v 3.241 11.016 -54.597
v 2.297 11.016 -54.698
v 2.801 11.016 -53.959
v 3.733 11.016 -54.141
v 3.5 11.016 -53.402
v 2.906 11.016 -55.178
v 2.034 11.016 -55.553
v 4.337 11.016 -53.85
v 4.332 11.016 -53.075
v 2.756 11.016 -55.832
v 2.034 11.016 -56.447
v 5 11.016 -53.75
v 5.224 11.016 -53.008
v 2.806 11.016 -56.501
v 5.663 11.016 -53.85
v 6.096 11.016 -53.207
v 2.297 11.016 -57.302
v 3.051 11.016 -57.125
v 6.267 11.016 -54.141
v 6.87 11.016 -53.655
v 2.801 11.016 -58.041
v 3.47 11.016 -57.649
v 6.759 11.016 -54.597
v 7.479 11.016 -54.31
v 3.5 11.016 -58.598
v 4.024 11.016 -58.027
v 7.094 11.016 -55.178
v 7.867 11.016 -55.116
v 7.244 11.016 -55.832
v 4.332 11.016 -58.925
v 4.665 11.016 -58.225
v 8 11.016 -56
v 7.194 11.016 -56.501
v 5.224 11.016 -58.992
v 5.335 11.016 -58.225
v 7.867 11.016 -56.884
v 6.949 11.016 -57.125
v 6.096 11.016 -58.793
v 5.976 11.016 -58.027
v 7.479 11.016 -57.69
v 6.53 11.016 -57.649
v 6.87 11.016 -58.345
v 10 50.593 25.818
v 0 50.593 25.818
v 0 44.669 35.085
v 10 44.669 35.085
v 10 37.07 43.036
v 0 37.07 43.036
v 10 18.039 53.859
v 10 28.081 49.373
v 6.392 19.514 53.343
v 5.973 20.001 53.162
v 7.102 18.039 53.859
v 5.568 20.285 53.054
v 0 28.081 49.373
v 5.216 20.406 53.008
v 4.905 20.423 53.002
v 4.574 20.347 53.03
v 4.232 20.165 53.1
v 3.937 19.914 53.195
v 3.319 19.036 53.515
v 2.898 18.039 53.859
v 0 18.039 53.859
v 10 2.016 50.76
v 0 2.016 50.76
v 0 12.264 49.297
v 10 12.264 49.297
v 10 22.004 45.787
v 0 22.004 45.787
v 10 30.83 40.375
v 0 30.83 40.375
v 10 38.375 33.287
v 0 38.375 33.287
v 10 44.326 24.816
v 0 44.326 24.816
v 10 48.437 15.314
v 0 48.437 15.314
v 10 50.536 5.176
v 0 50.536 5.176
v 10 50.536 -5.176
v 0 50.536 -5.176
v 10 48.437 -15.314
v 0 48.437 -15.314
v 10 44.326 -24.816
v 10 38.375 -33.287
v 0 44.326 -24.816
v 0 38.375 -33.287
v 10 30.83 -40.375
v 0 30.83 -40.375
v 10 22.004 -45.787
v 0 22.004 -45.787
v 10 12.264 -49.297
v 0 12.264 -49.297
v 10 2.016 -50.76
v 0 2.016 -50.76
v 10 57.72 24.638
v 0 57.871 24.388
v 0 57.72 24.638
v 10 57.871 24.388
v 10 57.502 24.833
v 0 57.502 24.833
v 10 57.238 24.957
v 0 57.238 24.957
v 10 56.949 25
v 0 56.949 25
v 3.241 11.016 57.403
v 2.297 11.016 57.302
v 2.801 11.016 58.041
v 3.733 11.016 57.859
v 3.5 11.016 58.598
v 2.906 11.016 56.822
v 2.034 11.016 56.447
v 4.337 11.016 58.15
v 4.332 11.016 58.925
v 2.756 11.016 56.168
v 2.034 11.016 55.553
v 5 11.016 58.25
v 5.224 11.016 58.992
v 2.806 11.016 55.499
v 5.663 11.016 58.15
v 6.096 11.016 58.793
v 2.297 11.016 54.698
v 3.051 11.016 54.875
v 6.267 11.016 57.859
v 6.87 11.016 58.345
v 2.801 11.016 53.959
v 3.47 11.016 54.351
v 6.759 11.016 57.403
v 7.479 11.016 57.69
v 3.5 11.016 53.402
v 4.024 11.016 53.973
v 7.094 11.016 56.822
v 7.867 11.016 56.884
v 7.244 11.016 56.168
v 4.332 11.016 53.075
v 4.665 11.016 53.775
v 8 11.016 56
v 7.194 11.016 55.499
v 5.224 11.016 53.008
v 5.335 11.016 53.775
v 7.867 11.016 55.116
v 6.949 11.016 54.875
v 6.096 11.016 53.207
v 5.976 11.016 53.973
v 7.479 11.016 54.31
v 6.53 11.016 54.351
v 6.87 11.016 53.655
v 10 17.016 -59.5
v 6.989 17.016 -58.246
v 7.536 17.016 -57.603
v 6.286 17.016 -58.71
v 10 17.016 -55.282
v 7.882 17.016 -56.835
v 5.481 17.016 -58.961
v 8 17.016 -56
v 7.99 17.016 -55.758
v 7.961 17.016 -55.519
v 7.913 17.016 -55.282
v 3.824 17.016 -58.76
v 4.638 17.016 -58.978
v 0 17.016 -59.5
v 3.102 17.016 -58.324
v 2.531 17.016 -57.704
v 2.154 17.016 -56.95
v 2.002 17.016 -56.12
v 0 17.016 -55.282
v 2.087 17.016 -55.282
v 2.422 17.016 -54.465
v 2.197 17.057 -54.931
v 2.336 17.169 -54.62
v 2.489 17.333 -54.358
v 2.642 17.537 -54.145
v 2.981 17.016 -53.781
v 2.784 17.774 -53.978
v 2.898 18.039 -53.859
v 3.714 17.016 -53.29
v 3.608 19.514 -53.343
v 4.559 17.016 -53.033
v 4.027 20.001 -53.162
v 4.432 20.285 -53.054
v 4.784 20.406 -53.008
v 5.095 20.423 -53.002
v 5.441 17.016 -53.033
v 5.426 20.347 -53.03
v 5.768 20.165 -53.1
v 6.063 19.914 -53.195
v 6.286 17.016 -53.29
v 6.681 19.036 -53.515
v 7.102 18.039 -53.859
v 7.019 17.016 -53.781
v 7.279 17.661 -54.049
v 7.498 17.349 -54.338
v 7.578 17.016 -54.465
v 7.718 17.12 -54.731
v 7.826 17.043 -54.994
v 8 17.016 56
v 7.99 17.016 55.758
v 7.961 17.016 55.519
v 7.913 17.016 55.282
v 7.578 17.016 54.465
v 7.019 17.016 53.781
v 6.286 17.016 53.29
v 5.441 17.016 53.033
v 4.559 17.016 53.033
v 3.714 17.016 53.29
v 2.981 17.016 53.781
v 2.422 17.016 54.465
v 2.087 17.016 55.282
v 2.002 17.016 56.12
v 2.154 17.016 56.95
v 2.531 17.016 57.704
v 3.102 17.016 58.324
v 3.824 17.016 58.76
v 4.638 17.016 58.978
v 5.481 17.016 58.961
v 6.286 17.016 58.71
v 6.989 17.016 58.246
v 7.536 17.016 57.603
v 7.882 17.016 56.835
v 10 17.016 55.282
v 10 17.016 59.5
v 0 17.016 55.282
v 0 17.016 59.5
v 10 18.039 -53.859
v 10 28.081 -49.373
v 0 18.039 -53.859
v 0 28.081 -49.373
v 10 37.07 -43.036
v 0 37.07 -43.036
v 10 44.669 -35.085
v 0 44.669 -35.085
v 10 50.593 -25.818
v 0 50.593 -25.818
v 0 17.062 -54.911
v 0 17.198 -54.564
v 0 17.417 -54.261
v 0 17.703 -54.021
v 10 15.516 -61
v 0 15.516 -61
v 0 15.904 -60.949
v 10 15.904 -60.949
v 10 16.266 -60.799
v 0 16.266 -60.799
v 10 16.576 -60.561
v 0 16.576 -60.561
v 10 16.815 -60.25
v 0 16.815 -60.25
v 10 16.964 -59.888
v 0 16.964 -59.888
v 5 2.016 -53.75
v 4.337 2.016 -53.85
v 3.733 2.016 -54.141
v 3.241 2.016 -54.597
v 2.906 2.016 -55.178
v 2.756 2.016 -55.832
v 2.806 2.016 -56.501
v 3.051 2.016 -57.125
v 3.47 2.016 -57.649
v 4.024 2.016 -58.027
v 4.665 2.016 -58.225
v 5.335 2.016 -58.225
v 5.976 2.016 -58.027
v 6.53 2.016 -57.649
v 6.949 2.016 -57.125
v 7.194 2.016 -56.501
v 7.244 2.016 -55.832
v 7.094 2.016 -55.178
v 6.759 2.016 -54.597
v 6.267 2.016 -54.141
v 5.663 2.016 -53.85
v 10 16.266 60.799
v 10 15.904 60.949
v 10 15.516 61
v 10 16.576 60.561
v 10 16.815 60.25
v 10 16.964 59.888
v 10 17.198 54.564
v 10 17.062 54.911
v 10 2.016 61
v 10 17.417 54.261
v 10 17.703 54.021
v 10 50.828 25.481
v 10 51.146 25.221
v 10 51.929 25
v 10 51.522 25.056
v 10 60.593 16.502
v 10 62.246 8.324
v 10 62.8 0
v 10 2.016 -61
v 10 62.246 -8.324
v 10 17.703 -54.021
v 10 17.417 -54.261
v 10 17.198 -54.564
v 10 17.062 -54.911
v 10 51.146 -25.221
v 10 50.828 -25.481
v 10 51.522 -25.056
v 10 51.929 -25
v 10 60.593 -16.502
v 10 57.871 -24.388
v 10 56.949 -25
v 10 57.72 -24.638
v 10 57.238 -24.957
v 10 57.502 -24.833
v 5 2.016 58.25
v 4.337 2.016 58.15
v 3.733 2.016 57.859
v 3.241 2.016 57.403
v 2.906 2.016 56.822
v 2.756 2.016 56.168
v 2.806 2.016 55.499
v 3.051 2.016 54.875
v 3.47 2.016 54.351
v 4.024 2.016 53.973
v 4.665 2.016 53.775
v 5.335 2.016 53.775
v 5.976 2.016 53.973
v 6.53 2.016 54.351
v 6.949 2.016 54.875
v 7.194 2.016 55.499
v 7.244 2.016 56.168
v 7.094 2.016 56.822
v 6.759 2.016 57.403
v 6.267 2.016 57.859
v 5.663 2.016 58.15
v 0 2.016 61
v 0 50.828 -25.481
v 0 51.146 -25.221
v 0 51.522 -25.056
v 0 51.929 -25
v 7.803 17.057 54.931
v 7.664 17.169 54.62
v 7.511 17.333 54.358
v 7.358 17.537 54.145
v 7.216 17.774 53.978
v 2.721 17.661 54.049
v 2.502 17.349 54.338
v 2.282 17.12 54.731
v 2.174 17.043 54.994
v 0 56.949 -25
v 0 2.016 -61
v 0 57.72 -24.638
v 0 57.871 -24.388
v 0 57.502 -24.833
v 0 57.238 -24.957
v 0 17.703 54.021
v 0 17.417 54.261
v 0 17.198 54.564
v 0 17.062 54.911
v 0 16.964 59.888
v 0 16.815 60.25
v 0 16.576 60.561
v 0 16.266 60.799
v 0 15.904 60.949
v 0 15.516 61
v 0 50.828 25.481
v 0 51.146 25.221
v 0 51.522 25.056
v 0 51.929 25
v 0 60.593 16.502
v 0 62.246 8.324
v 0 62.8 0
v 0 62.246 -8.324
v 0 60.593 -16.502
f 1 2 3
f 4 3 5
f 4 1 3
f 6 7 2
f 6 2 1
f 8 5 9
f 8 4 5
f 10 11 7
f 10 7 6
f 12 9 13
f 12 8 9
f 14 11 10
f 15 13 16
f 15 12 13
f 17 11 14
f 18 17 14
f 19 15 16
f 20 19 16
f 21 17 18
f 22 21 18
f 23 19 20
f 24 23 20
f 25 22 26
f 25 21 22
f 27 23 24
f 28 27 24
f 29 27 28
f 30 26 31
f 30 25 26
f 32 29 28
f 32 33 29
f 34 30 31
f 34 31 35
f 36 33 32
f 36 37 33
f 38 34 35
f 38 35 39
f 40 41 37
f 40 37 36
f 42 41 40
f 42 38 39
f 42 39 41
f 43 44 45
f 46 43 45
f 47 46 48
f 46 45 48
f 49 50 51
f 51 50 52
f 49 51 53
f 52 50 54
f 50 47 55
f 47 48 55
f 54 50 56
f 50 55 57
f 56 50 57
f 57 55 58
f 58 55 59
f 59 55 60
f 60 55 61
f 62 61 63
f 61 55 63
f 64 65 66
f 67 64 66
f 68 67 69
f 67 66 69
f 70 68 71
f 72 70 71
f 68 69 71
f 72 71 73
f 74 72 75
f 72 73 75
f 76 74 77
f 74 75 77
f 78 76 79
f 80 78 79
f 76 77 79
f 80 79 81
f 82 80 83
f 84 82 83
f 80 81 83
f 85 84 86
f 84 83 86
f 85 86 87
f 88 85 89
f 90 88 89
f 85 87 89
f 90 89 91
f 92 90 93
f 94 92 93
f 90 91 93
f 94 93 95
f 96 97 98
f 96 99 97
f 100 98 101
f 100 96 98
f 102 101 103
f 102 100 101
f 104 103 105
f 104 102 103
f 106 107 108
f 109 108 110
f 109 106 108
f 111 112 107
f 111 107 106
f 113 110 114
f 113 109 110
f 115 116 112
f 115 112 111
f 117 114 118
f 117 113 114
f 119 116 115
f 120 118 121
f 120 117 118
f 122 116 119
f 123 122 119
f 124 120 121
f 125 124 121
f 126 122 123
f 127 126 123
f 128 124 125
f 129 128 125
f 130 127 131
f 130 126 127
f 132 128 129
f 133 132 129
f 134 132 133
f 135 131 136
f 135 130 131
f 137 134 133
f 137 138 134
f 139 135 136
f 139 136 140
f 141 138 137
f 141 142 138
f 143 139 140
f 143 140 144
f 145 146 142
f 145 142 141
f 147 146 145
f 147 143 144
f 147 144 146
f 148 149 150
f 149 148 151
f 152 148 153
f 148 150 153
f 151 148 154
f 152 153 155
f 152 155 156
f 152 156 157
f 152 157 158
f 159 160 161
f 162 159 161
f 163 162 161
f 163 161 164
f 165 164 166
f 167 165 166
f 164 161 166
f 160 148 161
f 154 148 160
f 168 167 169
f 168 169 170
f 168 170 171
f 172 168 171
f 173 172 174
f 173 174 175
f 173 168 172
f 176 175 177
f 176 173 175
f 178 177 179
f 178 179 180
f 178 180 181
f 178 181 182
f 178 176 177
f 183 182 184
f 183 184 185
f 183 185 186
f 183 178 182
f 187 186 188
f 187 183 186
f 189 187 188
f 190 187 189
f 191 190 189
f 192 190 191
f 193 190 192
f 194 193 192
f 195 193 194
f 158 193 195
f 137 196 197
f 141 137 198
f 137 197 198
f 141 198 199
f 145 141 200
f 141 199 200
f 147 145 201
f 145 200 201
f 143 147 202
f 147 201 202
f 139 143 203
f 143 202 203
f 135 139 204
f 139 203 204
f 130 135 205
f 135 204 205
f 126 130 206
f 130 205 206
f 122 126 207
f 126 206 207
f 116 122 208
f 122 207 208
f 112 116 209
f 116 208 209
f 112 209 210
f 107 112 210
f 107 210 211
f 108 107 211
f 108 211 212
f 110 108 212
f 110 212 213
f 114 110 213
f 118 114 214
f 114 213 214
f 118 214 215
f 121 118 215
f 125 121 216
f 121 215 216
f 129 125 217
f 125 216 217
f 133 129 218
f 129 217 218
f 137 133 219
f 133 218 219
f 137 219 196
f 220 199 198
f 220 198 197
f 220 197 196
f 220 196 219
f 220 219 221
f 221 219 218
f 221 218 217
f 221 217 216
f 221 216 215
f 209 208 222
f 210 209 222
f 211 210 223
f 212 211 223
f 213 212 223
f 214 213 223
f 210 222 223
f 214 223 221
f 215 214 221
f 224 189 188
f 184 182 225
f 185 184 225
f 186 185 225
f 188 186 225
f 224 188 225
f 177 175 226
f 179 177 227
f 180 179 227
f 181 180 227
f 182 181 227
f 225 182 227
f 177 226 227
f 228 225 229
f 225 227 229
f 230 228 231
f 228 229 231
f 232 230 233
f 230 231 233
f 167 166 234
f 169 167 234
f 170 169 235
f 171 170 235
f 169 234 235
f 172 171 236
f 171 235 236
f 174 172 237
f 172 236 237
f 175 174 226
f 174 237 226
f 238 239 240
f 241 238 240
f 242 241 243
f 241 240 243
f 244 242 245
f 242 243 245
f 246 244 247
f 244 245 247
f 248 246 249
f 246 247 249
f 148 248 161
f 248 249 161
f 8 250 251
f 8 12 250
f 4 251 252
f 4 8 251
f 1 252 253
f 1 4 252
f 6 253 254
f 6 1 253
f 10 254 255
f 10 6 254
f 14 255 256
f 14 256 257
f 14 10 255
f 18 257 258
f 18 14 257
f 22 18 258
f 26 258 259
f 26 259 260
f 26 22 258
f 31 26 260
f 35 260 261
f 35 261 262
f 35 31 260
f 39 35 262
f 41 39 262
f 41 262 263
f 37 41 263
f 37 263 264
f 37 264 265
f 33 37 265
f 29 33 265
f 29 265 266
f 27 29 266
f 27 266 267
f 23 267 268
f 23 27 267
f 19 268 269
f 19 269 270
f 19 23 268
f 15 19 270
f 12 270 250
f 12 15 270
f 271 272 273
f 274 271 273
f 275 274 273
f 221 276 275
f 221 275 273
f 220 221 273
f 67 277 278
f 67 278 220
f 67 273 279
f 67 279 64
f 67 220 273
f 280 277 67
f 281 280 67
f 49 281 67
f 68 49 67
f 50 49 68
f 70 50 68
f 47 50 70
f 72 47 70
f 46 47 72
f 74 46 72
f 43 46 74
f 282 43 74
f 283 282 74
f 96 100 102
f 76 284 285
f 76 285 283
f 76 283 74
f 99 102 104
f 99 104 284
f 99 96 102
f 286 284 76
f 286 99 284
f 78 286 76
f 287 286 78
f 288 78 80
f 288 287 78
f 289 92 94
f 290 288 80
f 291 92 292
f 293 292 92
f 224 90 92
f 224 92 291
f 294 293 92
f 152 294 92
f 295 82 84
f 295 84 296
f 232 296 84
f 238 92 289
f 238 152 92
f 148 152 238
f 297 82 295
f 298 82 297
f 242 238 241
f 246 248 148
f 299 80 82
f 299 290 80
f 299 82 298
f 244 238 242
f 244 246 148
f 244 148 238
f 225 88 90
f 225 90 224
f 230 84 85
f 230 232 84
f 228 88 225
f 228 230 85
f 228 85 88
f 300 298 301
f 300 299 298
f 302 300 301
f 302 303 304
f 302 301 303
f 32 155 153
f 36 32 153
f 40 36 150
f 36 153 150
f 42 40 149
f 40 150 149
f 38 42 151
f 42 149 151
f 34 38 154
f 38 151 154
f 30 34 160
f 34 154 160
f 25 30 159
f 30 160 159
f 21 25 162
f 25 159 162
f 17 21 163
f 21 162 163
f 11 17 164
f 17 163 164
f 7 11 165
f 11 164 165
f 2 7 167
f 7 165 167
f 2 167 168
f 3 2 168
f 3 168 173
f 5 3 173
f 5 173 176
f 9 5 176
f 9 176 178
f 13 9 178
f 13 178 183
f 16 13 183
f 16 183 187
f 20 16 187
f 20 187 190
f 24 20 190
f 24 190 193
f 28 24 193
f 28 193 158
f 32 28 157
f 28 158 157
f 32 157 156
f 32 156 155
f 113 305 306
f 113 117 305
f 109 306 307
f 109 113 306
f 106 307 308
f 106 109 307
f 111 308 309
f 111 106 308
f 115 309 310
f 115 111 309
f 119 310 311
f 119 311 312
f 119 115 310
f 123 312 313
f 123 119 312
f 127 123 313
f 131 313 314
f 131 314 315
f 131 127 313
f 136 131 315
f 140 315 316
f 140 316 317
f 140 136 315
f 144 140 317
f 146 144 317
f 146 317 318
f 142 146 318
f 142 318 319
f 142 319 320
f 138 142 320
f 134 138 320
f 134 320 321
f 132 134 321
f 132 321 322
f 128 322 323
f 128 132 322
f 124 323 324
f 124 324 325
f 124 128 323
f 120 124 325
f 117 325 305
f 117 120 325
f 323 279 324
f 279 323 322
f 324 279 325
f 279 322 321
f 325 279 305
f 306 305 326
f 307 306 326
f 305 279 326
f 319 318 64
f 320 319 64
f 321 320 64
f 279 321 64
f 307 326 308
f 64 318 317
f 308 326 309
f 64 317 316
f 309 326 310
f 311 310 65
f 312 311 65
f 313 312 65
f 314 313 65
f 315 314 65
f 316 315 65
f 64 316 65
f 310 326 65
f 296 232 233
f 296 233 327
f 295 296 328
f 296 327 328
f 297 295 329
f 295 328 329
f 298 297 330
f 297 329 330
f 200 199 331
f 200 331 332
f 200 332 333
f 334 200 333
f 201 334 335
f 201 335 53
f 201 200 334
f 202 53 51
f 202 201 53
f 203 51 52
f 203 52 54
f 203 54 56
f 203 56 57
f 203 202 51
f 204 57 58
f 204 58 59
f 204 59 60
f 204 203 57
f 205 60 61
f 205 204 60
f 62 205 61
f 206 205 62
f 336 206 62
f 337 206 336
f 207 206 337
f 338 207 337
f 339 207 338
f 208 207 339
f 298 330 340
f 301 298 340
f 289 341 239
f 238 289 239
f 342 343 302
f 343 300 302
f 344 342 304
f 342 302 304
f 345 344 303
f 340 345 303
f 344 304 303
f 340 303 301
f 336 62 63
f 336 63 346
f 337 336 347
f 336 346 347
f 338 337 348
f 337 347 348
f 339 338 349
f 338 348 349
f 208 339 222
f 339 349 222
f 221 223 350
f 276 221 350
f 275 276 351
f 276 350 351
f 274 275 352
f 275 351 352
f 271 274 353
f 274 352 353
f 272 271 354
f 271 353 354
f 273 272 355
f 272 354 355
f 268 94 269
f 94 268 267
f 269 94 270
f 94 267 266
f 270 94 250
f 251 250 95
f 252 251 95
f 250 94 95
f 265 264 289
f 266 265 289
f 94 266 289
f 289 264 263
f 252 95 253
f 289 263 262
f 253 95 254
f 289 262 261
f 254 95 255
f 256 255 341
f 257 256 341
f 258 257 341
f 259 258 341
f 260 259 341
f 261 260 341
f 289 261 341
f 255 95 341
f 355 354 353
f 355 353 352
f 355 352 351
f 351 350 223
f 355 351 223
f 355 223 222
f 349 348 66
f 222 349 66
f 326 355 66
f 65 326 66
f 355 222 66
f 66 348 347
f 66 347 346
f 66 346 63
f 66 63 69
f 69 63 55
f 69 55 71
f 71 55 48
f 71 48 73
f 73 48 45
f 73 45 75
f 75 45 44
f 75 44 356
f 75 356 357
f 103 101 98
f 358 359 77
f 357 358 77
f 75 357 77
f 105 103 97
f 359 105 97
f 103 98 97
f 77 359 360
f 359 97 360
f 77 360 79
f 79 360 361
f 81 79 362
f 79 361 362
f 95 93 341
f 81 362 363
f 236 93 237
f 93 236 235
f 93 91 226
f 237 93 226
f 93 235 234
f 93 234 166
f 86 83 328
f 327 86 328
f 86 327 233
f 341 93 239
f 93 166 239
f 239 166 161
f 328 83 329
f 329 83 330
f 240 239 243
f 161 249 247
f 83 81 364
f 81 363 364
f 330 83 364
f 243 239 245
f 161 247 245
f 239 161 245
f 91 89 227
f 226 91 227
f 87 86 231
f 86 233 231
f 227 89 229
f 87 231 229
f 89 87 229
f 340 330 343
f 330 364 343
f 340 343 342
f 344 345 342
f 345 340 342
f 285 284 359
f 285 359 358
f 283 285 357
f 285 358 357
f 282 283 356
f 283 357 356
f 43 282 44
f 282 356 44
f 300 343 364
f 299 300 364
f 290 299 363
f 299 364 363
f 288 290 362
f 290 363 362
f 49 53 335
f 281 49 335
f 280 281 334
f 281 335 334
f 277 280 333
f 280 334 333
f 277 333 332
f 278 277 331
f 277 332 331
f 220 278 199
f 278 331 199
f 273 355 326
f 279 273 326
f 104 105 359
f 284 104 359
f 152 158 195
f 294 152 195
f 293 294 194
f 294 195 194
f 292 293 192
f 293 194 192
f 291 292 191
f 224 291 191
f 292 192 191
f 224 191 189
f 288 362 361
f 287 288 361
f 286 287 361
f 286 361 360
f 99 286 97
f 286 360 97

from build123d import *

# Parameters (mm, degrees)
BOSS_EXTRUDE1_DEPTH           = 10
M4_CLEARANCE_HOLE1_AT_2_COUNT = 2
M4_CLEARANCE_HOLE1_AT_2_PITCH = 112
SKETCH6_R                     = 3
CUT_EXTRUDE1_DEPTH            = 8
CUT_EXTRUDE1_DEPTH_BACK       = 6
FILLET1_R                     = 1


with BuildPart() as part:
    # Sketch1 → Boss-Extrude1 (new body)
    with BuildSketch(Plane(origin=(0, 0, 0), x_dir=(0, 0, -1), z_dir=(1, 0, 0))):
        with BuildLine():
            ThreePointArc((25, 57.609374237), (12.766583292, 61.488652214), (0, 62.8))
            ThreePointArc((0, 62.8), (-12.766583292, 61.488652214), (-25, 57.609374237))
            Line((-25, 57.609374237), (-25, 51.929182547))
            ThreePointArc((-25, 51.929182547), (-25.220795702, 51.145833095), (-25.818181818, 50.593097233))
            ThreePointArc((-25.818181818, 50.593097233), (-43.035646203, 37.069841595), (-53.859344034, 18.039153533))
            ThreePointArc((-53.859344034, 18.039153533), (-54.405495004, 17.298046479), (-55.281685866, 17.01553963))
            Line((-55.281685866, 17.01553963), (-59.5, 17.01553963))
            ThreePointArc((-59.5, 17.01553963), (-60.560660172, 16.576199802), (-61, 15.51553963))
            Line((-61, 15.51553963), (-61, 2.01553963))
            Line((-61, 2.01553963), (-50.76, 2.01553963))
            ThreePointArc((-50.76, 2.01553963), (0, 50.8), (50.76, 2.01553963))
            Line((50.76, 2.01553963), (61, 2.01553963))
            Line((61, 2.01553963), (61, 15.51553963))
            ThreePointArc((61, 15.51553963), (60.560660172, 16.576199802), (59.5, 17.01553963))
            Line((59.5, 17.01553963), (55.281685866, 17.01553963))
            ThreePointArc((55.281685866, 17.01553963), (54.405495004, 17.298046479), (53.859344034, 18.039153533))
            ThreePointArc((53.859344034, 18.039153533), (43.035646203, 37.069841595), (25.818181818, 50.593097233))
            ThreePointArc((25.818181818, 50.593097233), (25.220795702, 51.145833095), (25, 51.929182547))
            Line((25, 51.929182547), (25, 57.609374237))
        make_face()
    extrude(amount=BOSS_EXTRUDE1_DEPTH)

    # Sketch4 → M4 Clearance Hole1 (revolve, cut)
    with BuildSketch(Plane(origin=(5, 17.01553963, -56), x_dir=(0, 0, 1), z_dir=(1, 0, 0))):
        Polygon((0, 0), (0, 16.351936393), (2.25, 15), (2.25, 0), align=None)
    m4_clearance_hole1 = revolve(axis=Axis((5, 23.36553963, -56), (0, -1, 0)), mode=Mode.SUBTRACT)

    # M4 Clearance Hole1 at 2: M4 Clearance Hole1 ×2
    with Locations(*[(0, 0, i * M4_CLEARANCE_HOLE1_AT_2_PITCH) for i in range(1, M4_CLEARANCE_HOLE1_AT_2_COUNT)]):
        add(m4_clearance_hole1, mode=Mode.SUBTRACT)

    # Sketch6 → Cut-Extrude1 (cut, two sides)
    with BuildSketch(Plane(origin=(0, 17.01553963, 0), x_dir=(1, 0, 0), z_dir=(0, 1, 0))) as cut_extrude1_sk:
        with Locations((5, 56)):
            Circle(SKETCH6_R)
        with Locations((5, -56)):
            Circle(SKETCH6_R)
    extrude(amount=CUT_EXTRUDE1_DEPTH, mode=Mode.SUBTRACT)
    extrude(cut_extrude1_sk.sketch, amount=-CUT_EXTRUDE1_DEPTH_BACK, mode=Mode.SUBTRACT)

    # Fillet1
    fillet1_edges = [part.edges().sort_by_distance(p)[0] for p in [
        (5, 57.609374237, -25),
        (5, 57.609374237, 25),
    ]]
    fillet(fillet1_edges, radius=FILLET1_R)


solid = part.part
